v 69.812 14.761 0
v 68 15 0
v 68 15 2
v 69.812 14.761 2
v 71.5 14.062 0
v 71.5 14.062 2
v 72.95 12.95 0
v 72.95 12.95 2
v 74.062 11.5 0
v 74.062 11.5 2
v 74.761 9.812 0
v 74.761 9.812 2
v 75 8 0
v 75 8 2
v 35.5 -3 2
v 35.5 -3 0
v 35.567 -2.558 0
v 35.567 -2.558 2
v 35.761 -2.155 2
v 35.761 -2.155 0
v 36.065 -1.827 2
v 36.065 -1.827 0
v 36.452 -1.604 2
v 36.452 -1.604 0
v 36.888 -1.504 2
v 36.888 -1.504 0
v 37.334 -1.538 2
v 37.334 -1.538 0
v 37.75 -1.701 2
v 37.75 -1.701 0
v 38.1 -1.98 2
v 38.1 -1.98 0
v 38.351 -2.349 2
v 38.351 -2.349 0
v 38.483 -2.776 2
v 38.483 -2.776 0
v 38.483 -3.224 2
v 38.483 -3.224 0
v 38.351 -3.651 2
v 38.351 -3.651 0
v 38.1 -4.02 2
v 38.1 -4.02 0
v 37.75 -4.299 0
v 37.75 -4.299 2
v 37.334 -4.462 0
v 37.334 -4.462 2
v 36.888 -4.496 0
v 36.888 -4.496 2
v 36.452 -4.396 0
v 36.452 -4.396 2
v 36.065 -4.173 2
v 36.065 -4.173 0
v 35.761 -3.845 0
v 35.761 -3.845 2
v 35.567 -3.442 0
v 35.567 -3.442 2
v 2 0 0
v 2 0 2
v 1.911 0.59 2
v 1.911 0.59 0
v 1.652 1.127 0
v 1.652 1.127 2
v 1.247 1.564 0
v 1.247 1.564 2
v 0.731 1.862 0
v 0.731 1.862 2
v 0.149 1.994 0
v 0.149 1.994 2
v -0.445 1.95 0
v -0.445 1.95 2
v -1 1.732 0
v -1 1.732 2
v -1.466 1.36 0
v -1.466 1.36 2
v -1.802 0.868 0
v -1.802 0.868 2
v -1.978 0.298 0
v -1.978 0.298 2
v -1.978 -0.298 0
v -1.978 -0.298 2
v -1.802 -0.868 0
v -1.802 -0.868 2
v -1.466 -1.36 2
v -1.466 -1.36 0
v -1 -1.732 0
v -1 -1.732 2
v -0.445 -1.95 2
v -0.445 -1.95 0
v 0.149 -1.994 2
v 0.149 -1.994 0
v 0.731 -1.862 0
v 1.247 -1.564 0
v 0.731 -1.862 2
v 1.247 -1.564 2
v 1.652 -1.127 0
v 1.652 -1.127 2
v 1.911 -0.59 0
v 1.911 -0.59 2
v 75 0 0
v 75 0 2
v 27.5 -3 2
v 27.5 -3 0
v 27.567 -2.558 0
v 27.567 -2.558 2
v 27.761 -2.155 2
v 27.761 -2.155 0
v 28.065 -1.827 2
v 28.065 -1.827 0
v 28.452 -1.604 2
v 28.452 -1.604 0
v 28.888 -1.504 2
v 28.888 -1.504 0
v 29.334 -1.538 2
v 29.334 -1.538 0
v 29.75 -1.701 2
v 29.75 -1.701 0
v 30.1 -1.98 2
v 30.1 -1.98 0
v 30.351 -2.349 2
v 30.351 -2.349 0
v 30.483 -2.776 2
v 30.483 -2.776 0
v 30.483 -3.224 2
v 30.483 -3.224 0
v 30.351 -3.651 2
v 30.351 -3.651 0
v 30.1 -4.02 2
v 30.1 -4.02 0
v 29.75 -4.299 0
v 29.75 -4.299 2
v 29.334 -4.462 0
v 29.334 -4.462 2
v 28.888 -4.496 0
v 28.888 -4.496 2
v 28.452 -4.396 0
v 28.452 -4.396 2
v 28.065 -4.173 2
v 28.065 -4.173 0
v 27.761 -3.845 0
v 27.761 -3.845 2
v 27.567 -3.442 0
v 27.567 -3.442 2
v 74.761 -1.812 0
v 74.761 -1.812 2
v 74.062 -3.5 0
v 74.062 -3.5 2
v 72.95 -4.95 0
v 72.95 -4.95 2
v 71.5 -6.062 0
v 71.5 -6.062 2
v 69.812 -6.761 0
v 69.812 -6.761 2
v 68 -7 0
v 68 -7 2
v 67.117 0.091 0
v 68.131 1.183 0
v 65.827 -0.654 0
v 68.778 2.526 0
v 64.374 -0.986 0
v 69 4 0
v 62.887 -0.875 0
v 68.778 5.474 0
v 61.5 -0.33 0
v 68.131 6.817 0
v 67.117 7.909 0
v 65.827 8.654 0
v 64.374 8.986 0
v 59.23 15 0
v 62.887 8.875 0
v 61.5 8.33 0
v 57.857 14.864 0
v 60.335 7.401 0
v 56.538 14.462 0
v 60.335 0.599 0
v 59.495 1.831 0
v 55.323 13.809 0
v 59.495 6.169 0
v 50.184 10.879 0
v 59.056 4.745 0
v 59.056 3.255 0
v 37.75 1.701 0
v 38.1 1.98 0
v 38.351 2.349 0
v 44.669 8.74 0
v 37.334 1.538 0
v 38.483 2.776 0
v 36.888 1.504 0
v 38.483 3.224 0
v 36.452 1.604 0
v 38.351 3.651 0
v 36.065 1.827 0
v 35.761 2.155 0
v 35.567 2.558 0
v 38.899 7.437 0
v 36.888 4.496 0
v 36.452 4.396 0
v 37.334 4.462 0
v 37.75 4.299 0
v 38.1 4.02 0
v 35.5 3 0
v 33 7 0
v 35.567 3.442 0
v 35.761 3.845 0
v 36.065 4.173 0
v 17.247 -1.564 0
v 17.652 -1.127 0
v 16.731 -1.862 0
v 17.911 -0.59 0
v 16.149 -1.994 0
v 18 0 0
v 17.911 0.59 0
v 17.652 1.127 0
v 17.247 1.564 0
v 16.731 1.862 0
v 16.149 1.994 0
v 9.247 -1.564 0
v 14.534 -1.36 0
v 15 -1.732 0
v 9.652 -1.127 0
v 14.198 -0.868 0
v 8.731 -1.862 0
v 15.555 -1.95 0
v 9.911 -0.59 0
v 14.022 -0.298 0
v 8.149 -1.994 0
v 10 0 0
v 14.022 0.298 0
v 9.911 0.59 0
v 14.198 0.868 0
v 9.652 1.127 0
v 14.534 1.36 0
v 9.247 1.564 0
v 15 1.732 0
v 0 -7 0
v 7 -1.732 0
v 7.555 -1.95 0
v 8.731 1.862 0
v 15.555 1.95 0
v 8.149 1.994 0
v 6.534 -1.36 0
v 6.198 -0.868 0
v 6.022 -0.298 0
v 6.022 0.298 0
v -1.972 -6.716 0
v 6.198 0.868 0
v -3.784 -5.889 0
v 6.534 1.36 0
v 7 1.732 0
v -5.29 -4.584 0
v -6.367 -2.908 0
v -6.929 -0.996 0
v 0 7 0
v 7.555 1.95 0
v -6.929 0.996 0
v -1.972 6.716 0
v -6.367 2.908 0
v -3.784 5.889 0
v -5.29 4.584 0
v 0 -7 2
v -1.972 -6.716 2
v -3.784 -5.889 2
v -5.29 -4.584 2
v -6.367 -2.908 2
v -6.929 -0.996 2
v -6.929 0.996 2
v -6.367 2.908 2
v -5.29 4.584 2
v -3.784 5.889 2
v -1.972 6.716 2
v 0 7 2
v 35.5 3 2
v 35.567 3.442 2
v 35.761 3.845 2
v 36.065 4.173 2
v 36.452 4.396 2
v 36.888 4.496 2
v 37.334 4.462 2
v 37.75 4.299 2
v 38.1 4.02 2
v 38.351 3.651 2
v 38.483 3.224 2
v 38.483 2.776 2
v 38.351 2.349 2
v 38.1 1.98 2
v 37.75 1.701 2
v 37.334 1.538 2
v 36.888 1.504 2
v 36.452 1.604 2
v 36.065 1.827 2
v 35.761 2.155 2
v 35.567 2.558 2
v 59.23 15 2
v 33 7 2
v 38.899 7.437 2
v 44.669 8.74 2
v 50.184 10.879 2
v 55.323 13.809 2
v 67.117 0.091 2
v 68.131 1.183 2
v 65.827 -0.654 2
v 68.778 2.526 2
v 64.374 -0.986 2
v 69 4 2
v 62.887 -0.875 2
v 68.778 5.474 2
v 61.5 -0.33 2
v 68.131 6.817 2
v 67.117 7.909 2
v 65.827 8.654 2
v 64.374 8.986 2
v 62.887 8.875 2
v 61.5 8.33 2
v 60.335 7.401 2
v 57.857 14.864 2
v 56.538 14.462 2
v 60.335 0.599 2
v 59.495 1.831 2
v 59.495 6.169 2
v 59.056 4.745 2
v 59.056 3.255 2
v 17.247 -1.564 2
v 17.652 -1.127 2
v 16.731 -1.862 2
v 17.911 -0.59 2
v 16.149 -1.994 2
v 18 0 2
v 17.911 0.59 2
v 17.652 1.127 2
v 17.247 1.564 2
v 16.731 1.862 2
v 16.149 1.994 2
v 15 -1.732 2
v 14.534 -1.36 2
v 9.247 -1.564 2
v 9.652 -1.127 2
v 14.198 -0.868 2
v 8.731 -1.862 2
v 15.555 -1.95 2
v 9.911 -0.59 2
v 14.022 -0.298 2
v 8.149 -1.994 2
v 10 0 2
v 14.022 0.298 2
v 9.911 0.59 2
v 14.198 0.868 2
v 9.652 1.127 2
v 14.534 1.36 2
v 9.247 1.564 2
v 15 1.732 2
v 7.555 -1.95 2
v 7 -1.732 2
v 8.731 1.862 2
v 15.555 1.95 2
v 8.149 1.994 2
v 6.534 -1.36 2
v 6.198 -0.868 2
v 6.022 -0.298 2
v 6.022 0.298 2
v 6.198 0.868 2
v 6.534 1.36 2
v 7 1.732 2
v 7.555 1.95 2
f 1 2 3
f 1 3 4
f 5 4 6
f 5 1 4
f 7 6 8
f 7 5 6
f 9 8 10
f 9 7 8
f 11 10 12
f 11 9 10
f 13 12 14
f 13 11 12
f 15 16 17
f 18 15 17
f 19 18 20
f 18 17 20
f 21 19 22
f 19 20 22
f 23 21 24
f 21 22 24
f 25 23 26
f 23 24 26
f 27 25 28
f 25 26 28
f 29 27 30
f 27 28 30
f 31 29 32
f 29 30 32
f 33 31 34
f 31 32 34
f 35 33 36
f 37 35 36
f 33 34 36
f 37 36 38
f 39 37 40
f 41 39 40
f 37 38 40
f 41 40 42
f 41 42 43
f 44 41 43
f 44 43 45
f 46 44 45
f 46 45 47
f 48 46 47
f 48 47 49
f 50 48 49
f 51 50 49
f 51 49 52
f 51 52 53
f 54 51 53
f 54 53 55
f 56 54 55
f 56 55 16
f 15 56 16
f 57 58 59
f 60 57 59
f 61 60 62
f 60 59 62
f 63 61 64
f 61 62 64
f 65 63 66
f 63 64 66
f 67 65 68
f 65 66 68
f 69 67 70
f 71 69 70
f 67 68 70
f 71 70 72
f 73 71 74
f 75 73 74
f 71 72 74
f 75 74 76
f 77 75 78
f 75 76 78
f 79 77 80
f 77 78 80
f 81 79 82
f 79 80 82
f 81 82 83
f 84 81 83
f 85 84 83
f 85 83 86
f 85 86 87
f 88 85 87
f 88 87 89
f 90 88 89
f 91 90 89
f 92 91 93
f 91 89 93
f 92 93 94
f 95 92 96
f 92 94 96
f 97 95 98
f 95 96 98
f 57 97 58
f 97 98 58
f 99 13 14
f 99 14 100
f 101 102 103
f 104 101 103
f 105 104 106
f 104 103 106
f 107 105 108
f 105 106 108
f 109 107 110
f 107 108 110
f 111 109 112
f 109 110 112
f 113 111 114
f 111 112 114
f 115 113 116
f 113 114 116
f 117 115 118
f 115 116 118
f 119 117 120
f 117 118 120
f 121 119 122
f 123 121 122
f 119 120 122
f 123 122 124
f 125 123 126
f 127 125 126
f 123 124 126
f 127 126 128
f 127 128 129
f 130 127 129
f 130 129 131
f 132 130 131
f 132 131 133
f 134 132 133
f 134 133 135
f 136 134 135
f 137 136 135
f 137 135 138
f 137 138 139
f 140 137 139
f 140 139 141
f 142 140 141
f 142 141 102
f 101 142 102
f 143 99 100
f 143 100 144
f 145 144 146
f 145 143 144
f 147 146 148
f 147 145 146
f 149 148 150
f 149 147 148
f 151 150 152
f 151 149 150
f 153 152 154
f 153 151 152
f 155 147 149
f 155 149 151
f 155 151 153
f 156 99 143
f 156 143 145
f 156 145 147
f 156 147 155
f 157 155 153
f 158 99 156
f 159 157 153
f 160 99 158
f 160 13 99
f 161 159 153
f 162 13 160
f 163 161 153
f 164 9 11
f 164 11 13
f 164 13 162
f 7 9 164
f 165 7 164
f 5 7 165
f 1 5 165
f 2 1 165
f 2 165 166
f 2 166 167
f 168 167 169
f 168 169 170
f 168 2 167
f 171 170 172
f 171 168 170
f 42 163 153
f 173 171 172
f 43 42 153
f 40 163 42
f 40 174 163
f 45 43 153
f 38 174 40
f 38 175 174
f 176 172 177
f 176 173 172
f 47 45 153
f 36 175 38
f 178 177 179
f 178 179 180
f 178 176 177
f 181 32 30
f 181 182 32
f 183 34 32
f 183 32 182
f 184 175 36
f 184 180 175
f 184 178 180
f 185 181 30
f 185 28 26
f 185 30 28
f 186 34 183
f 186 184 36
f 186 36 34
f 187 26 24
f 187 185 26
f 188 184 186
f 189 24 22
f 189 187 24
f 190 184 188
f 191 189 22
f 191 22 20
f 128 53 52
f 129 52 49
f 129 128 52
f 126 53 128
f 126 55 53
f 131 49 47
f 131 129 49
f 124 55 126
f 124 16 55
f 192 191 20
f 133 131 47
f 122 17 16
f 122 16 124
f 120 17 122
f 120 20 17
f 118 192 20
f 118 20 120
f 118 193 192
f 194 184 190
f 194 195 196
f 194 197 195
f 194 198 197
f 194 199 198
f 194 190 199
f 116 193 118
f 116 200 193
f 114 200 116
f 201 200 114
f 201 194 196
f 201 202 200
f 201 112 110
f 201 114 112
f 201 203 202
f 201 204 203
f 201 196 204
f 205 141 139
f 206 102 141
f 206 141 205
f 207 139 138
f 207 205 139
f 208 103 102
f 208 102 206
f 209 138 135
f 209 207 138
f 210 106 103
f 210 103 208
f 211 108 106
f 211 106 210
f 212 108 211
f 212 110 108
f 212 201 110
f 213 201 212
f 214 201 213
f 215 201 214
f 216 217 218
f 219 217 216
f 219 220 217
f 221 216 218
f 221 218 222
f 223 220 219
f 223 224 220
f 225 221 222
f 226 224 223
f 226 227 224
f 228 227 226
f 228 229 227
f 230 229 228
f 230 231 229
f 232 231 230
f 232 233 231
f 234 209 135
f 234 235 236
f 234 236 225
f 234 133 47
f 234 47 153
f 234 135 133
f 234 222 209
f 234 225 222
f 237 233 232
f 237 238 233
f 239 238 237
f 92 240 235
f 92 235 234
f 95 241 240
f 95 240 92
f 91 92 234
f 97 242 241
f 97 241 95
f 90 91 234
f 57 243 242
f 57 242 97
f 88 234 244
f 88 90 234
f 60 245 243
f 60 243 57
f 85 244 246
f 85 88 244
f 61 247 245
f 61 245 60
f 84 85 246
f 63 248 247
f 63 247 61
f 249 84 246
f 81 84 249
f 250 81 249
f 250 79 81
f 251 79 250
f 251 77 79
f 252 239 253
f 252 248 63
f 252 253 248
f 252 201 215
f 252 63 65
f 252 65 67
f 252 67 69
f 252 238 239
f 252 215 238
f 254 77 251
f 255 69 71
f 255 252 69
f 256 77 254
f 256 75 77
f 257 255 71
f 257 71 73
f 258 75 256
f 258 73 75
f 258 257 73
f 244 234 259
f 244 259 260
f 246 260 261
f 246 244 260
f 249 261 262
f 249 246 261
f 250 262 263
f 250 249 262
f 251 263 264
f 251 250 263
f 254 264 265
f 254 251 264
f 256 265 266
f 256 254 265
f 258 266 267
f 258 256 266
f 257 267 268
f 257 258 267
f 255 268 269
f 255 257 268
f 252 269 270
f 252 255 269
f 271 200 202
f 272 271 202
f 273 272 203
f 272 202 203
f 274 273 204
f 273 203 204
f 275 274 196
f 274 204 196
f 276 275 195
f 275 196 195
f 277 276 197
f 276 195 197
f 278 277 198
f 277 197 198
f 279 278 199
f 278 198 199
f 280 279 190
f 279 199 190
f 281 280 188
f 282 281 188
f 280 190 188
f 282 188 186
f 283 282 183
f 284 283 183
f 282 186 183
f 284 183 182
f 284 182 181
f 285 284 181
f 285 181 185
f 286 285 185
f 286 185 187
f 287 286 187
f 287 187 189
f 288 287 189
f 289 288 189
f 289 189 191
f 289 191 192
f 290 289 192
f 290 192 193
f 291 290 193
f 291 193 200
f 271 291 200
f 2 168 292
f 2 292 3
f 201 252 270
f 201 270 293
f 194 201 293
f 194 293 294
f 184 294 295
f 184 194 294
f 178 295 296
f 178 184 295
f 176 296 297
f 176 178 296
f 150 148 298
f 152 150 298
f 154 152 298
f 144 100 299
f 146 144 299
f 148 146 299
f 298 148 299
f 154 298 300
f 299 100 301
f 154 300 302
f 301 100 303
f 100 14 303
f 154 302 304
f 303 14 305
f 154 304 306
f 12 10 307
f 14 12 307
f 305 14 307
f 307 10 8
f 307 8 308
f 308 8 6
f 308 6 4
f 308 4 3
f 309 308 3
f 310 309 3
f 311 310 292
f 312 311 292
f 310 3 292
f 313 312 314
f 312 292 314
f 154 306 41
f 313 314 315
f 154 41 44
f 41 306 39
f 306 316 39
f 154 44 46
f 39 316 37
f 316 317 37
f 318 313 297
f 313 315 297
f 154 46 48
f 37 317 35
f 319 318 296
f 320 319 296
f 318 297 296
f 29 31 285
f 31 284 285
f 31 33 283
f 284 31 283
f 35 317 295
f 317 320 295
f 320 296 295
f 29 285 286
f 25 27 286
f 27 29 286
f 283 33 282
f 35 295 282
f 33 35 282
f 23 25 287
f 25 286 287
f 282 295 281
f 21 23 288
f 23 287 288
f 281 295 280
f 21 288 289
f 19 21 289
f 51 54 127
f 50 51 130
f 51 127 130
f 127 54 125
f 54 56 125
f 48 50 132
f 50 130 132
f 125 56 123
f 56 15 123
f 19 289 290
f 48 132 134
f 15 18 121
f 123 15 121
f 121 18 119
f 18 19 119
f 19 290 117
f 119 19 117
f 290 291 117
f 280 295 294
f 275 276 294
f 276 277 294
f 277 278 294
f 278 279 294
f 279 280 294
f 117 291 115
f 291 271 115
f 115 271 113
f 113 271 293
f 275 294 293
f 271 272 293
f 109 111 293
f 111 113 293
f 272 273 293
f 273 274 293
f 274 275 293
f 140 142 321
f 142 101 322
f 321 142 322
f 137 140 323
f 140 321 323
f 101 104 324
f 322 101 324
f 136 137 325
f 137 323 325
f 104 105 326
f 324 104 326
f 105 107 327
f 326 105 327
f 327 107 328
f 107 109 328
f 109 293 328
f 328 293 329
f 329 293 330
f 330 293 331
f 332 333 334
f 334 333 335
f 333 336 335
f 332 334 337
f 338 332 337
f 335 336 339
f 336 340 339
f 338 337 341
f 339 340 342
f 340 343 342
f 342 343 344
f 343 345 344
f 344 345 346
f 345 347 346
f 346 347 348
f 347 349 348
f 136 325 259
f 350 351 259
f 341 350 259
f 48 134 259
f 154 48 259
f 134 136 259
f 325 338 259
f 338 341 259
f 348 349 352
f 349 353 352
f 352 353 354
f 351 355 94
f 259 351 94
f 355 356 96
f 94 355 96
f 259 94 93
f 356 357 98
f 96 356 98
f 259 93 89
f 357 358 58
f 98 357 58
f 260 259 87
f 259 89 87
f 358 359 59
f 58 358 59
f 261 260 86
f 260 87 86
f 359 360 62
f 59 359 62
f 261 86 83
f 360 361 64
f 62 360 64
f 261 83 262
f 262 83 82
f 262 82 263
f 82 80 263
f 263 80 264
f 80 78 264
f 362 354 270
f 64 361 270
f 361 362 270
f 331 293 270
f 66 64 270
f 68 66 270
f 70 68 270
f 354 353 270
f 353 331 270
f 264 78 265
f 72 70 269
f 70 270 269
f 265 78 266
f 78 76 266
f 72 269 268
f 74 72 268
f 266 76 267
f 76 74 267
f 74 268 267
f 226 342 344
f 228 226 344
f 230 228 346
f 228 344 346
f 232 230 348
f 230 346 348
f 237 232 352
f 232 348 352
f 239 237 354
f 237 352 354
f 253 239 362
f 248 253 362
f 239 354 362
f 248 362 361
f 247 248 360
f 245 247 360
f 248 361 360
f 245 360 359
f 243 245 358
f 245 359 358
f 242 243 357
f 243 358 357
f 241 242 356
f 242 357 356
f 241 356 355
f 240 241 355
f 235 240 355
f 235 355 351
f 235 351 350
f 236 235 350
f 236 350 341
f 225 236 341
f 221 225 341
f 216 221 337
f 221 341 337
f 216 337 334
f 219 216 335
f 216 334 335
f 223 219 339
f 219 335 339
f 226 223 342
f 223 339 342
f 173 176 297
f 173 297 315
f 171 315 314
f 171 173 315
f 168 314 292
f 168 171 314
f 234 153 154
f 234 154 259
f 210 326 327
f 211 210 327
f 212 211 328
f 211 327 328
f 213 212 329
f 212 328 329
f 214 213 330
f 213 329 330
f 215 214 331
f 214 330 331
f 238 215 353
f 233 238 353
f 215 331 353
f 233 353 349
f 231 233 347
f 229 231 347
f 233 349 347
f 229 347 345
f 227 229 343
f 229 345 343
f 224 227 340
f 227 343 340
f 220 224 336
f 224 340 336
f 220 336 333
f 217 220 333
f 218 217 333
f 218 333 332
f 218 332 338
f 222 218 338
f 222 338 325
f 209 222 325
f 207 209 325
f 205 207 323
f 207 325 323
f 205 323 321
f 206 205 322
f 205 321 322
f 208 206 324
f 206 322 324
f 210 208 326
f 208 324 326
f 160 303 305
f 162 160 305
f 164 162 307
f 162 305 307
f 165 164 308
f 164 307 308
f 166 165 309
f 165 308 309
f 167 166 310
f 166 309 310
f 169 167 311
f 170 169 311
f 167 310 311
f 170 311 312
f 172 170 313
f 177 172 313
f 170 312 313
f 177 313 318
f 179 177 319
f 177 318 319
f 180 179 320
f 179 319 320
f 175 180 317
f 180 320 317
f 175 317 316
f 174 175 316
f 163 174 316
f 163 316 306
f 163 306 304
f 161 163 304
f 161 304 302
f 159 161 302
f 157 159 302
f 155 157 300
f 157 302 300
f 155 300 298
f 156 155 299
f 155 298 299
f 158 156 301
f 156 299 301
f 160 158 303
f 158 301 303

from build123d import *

# Parameters (mm, degrees)
BOSS_EXTRUDE1_DEPTH   = 2
SKETCH2_R             = 2
CUT_EXTRUDE1_DEPTH    = 2
SKETCH3_R             = 5
CUT_EXTRUDE2_DEPTH    = 2
F_3_0MM_DOWEL_HOLE2_D = 3


with BuildPart() as part:
    # Sketch1 → Boss-Extrude1 (new body)
    with BuildSketch(Plane.XY):
        with BuildLine():
            Line((0, 7), (33, 7))
            ThreePointArc((33, 7), (44.66919932, 8.739971416), (55.323194976, 13.808510638))
            ThreePointArc((55.323194976, 13.808510638), (57.187644216, 14.695505002), (59.229754097, 15))
            Line((59.229754097, 15), (68, 15))
            ThreePointArc((68, 15), (72.949747468, 12.949747468), (75, 8))
            Line((75, 8), (75, 0))
            ThreePointArc((75, 0), (72.949747468, -4.949747468), (68, -7))
            Line((68, -7), (0, -7))
            ThreePointArc((0, -7), (-7, 0), (0, 7))
        make_face()
    extrude(amount=BOSS_EXTRUDE1_DEPTH)

    # Sketch2 → Cut-Extrude1 (cut)
    with BuildSketch(Plane.XY.offset(2)):
        Circle(SKETCH2_R)
        with Locations((8, 0)):
            Circle(SKETCH2_R)
        with Locations((16, 0)):
            Circle(SKETCH2_R)
    extrude(amount=-CUT_EXTRUDE1_DEPTH, mode=Mode.SUBTRACT)

    # Sketch3 → Cut-Extrude2 (cut)
    with BuildSketch(Plane.XY.offset(2)):
        with Locations((64, 4)):
            Circle(SKETCH3_R)
    extrude(amount=-CUT_EXTRUDE2_DEPTH, mode=Mode.SUBTRACT)

    # Ø3.0mm Dowel Hole2 (through all)
    with Locations(Plane.XY.offset(2)):
        with Locations((29, -3), (37, -3), (37, 3)):
            Hole(F_3_0MM_DOWEL_HOLE2_D / 2)


solid = part.part
